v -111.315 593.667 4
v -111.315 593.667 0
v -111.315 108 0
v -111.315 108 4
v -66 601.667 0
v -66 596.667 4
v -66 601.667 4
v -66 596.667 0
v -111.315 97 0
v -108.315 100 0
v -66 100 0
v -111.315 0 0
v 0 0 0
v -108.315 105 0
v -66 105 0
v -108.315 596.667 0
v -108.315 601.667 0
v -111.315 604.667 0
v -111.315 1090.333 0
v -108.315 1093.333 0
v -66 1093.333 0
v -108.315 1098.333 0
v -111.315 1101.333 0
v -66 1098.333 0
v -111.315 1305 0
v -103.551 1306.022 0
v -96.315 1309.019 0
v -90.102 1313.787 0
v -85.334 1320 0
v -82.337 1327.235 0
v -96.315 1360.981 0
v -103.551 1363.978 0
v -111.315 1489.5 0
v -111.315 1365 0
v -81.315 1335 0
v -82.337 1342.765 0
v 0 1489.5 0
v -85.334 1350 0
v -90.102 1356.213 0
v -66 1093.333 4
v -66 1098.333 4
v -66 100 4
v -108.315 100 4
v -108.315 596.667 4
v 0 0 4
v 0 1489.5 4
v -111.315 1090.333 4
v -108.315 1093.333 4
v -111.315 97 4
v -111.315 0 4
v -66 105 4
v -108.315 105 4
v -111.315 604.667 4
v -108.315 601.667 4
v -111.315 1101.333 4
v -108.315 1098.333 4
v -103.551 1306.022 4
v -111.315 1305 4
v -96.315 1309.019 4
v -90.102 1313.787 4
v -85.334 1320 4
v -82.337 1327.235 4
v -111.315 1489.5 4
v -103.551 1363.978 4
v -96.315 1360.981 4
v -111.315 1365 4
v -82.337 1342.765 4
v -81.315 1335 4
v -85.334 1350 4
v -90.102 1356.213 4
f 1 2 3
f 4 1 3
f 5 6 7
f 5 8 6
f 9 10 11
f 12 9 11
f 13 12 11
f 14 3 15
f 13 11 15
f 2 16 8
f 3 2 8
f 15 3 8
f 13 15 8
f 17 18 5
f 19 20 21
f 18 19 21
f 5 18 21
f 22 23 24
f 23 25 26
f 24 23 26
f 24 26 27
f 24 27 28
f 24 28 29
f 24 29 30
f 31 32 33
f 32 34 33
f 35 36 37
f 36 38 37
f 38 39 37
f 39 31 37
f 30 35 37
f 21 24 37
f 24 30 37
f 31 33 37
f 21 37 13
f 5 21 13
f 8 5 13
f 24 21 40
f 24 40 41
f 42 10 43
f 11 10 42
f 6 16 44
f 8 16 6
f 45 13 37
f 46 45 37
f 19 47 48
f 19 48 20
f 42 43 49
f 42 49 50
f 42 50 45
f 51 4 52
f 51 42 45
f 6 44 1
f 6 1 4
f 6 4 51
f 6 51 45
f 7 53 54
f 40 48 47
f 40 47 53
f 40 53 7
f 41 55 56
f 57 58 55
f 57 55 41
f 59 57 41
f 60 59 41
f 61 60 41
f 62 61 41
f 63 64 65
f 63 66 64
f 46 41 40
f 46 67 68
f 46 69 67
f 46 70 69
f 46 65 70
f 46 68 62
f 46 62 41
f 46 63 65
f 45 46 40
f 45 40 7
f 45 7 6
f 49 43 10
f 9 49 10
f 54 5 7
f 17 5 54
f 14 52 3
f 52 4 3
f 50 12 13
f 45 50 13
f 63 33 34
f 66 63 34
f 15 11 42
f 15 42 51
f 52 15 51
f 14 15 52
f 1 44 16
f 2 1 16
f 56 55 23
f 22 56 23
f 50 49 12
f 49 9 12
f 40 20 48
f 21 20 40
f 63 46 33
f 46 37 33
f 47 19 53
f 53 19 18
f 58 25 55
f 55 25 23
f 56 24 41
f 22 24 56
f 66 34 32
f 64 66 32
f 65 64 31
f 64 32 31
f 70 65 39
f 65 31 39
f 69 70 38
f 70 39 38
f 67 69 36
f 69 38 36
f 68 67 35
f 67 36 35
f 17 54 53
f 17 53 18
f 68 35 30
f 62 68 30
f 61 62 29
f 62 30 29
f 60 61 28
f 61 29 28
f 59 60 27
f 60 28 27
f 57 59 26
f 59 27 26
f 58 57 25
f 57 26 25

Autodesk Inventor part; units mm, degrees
ref_plane "YZ Plane" through (0, 0, 0) normal (1, 0, 0) x (0, 1, 0)
ref_plane "XZ Plane" through (0, 0, 0) normal (0, 1, 0) x (-1, 0, 0)
ref_plane "XY Plane" through (0, 0, 0) normal (0, 0, 1) x (1, 0, 0)
sketch "Sketch1" plane through (0, 0, 0) normal (0, 0, 1) x (1, 0, 0)
  line L0 (0, 1489.5) -> (-111.3151, 1489.5)
  line L1 (-111.3151, 1489.5) -> (-111.3151, 0)
  line L2 (-111.3151, 0) -> (0, 0)
  line L3 (0, 0) -> (0, 1489.5)
  line L4 (-111.3151, 100) -> (-66, 100)
  line L5 (-66, 100) -> (-66, 105)
  line L6 (-66, 105) -> (-111.3151, 105)
  line L7 (-111.3151, 105) -> (-111.3151, 100)
  line L8 (-111.3151, 596.6667) -> (-66, 596.6667)
  line L9 (-66, 596.6667) -> (-66, 601.6667)
  line L10 (-66, 601.6667) -> (-111.3151, 601.6667)
  line L11 (-111.3151, 601.6667) -> (-111.3151, 596.6667)
  line L12 (-111.3151, 1093.3333) -> (-66, 1093.3333)
  line L13 (-66, 1093.3333) -> (-66, 1098.3333)
  line L14 (-66, 1098.3333) -> (-111.3151, 1098.3333)
  line L15 (-111.3151, 1098.3333) -> (-111.3151, 1093.3333)
  circle A0 centre (-111.3151, 1335) radius 30
  point P0 (-111.3151, 1098.3333)
  point P1 (-111.3151, 601.6667)
  point P2 (-111.3151, 1365)
  point P3 (-111.3151, 1305)
  dimension "d0" = 1489.5
  dimension "d1" = 111.3151
  dimension "d2" = 5
  dimension "d4" = 100
  dimension "d7" = 496.6667
  dimension "d23" = 66
  dimension "d29" = 60
  dimension "d30" = 1335
extrude "Plate1" add sketch "Sketch1" along normal blind 4 contours L3 L2 L1 L4 L5 L6 L8 L9 L10 L12 L13 L14 A0 L0
chamfer "Corner Chamfer1" distance 3 angle 45 6 edges at (-111.3151, 100, 2) (-111.3151, 105, 2) (-111.3151, 596.6667, 2) (-111.3151, 601.6667, 2) (-111.3151, 1098.3333, 2) (-111.3151, 1093.3333, 2)
equation "\"d0\" = Стрингер_длина"
equation "\"d1\" = стрингер_глубина_8"
equation "\"d2\" = паз_под_стрингер_толщина"
equation "\"d7\" = Шаг_шпангоутов"
equation "\"d23\" = паз_под_стрингер_глубина - Thickness"
equation "\"d29\" = 2 * радиус_выреза_под_сварку"
equation "\"d12\" = Thickness"
equation "\"BendRadius\" = Thickness"
equation "\"BendReliefWidth\" = Thickness"
equation "\"BendReliefDepth\" = 0.5 * Thickness"
equation "\"CornerReliefSize\" = 4 * Thickness"
equation "\"MinimumRemnant\" = 2 * Thickness"
equation "\"TransitionRadius\" = BendRadius"
equation "\"JacobiRadiusSize\" = BendRadius"
equation "\"GapSize\" = Thickness"
equation "\"Стрингер_длина\" = 1489.5"
equation "\"стрингер_глубина_8\" = 111.315065"
equation "\"паз_под_стрингер_толщина\" = 5"
equation "\"Шаг_шпангоутов\" = 496.666667"
equation "\"паз_под_стрингер_глубина\" = 70"
equation "\"Thickness\" = 4"
equation "\"радиус_выреза_под_сварку\" = 30"
properties part number "GBK 3313 stringer 8" material "Steel"
